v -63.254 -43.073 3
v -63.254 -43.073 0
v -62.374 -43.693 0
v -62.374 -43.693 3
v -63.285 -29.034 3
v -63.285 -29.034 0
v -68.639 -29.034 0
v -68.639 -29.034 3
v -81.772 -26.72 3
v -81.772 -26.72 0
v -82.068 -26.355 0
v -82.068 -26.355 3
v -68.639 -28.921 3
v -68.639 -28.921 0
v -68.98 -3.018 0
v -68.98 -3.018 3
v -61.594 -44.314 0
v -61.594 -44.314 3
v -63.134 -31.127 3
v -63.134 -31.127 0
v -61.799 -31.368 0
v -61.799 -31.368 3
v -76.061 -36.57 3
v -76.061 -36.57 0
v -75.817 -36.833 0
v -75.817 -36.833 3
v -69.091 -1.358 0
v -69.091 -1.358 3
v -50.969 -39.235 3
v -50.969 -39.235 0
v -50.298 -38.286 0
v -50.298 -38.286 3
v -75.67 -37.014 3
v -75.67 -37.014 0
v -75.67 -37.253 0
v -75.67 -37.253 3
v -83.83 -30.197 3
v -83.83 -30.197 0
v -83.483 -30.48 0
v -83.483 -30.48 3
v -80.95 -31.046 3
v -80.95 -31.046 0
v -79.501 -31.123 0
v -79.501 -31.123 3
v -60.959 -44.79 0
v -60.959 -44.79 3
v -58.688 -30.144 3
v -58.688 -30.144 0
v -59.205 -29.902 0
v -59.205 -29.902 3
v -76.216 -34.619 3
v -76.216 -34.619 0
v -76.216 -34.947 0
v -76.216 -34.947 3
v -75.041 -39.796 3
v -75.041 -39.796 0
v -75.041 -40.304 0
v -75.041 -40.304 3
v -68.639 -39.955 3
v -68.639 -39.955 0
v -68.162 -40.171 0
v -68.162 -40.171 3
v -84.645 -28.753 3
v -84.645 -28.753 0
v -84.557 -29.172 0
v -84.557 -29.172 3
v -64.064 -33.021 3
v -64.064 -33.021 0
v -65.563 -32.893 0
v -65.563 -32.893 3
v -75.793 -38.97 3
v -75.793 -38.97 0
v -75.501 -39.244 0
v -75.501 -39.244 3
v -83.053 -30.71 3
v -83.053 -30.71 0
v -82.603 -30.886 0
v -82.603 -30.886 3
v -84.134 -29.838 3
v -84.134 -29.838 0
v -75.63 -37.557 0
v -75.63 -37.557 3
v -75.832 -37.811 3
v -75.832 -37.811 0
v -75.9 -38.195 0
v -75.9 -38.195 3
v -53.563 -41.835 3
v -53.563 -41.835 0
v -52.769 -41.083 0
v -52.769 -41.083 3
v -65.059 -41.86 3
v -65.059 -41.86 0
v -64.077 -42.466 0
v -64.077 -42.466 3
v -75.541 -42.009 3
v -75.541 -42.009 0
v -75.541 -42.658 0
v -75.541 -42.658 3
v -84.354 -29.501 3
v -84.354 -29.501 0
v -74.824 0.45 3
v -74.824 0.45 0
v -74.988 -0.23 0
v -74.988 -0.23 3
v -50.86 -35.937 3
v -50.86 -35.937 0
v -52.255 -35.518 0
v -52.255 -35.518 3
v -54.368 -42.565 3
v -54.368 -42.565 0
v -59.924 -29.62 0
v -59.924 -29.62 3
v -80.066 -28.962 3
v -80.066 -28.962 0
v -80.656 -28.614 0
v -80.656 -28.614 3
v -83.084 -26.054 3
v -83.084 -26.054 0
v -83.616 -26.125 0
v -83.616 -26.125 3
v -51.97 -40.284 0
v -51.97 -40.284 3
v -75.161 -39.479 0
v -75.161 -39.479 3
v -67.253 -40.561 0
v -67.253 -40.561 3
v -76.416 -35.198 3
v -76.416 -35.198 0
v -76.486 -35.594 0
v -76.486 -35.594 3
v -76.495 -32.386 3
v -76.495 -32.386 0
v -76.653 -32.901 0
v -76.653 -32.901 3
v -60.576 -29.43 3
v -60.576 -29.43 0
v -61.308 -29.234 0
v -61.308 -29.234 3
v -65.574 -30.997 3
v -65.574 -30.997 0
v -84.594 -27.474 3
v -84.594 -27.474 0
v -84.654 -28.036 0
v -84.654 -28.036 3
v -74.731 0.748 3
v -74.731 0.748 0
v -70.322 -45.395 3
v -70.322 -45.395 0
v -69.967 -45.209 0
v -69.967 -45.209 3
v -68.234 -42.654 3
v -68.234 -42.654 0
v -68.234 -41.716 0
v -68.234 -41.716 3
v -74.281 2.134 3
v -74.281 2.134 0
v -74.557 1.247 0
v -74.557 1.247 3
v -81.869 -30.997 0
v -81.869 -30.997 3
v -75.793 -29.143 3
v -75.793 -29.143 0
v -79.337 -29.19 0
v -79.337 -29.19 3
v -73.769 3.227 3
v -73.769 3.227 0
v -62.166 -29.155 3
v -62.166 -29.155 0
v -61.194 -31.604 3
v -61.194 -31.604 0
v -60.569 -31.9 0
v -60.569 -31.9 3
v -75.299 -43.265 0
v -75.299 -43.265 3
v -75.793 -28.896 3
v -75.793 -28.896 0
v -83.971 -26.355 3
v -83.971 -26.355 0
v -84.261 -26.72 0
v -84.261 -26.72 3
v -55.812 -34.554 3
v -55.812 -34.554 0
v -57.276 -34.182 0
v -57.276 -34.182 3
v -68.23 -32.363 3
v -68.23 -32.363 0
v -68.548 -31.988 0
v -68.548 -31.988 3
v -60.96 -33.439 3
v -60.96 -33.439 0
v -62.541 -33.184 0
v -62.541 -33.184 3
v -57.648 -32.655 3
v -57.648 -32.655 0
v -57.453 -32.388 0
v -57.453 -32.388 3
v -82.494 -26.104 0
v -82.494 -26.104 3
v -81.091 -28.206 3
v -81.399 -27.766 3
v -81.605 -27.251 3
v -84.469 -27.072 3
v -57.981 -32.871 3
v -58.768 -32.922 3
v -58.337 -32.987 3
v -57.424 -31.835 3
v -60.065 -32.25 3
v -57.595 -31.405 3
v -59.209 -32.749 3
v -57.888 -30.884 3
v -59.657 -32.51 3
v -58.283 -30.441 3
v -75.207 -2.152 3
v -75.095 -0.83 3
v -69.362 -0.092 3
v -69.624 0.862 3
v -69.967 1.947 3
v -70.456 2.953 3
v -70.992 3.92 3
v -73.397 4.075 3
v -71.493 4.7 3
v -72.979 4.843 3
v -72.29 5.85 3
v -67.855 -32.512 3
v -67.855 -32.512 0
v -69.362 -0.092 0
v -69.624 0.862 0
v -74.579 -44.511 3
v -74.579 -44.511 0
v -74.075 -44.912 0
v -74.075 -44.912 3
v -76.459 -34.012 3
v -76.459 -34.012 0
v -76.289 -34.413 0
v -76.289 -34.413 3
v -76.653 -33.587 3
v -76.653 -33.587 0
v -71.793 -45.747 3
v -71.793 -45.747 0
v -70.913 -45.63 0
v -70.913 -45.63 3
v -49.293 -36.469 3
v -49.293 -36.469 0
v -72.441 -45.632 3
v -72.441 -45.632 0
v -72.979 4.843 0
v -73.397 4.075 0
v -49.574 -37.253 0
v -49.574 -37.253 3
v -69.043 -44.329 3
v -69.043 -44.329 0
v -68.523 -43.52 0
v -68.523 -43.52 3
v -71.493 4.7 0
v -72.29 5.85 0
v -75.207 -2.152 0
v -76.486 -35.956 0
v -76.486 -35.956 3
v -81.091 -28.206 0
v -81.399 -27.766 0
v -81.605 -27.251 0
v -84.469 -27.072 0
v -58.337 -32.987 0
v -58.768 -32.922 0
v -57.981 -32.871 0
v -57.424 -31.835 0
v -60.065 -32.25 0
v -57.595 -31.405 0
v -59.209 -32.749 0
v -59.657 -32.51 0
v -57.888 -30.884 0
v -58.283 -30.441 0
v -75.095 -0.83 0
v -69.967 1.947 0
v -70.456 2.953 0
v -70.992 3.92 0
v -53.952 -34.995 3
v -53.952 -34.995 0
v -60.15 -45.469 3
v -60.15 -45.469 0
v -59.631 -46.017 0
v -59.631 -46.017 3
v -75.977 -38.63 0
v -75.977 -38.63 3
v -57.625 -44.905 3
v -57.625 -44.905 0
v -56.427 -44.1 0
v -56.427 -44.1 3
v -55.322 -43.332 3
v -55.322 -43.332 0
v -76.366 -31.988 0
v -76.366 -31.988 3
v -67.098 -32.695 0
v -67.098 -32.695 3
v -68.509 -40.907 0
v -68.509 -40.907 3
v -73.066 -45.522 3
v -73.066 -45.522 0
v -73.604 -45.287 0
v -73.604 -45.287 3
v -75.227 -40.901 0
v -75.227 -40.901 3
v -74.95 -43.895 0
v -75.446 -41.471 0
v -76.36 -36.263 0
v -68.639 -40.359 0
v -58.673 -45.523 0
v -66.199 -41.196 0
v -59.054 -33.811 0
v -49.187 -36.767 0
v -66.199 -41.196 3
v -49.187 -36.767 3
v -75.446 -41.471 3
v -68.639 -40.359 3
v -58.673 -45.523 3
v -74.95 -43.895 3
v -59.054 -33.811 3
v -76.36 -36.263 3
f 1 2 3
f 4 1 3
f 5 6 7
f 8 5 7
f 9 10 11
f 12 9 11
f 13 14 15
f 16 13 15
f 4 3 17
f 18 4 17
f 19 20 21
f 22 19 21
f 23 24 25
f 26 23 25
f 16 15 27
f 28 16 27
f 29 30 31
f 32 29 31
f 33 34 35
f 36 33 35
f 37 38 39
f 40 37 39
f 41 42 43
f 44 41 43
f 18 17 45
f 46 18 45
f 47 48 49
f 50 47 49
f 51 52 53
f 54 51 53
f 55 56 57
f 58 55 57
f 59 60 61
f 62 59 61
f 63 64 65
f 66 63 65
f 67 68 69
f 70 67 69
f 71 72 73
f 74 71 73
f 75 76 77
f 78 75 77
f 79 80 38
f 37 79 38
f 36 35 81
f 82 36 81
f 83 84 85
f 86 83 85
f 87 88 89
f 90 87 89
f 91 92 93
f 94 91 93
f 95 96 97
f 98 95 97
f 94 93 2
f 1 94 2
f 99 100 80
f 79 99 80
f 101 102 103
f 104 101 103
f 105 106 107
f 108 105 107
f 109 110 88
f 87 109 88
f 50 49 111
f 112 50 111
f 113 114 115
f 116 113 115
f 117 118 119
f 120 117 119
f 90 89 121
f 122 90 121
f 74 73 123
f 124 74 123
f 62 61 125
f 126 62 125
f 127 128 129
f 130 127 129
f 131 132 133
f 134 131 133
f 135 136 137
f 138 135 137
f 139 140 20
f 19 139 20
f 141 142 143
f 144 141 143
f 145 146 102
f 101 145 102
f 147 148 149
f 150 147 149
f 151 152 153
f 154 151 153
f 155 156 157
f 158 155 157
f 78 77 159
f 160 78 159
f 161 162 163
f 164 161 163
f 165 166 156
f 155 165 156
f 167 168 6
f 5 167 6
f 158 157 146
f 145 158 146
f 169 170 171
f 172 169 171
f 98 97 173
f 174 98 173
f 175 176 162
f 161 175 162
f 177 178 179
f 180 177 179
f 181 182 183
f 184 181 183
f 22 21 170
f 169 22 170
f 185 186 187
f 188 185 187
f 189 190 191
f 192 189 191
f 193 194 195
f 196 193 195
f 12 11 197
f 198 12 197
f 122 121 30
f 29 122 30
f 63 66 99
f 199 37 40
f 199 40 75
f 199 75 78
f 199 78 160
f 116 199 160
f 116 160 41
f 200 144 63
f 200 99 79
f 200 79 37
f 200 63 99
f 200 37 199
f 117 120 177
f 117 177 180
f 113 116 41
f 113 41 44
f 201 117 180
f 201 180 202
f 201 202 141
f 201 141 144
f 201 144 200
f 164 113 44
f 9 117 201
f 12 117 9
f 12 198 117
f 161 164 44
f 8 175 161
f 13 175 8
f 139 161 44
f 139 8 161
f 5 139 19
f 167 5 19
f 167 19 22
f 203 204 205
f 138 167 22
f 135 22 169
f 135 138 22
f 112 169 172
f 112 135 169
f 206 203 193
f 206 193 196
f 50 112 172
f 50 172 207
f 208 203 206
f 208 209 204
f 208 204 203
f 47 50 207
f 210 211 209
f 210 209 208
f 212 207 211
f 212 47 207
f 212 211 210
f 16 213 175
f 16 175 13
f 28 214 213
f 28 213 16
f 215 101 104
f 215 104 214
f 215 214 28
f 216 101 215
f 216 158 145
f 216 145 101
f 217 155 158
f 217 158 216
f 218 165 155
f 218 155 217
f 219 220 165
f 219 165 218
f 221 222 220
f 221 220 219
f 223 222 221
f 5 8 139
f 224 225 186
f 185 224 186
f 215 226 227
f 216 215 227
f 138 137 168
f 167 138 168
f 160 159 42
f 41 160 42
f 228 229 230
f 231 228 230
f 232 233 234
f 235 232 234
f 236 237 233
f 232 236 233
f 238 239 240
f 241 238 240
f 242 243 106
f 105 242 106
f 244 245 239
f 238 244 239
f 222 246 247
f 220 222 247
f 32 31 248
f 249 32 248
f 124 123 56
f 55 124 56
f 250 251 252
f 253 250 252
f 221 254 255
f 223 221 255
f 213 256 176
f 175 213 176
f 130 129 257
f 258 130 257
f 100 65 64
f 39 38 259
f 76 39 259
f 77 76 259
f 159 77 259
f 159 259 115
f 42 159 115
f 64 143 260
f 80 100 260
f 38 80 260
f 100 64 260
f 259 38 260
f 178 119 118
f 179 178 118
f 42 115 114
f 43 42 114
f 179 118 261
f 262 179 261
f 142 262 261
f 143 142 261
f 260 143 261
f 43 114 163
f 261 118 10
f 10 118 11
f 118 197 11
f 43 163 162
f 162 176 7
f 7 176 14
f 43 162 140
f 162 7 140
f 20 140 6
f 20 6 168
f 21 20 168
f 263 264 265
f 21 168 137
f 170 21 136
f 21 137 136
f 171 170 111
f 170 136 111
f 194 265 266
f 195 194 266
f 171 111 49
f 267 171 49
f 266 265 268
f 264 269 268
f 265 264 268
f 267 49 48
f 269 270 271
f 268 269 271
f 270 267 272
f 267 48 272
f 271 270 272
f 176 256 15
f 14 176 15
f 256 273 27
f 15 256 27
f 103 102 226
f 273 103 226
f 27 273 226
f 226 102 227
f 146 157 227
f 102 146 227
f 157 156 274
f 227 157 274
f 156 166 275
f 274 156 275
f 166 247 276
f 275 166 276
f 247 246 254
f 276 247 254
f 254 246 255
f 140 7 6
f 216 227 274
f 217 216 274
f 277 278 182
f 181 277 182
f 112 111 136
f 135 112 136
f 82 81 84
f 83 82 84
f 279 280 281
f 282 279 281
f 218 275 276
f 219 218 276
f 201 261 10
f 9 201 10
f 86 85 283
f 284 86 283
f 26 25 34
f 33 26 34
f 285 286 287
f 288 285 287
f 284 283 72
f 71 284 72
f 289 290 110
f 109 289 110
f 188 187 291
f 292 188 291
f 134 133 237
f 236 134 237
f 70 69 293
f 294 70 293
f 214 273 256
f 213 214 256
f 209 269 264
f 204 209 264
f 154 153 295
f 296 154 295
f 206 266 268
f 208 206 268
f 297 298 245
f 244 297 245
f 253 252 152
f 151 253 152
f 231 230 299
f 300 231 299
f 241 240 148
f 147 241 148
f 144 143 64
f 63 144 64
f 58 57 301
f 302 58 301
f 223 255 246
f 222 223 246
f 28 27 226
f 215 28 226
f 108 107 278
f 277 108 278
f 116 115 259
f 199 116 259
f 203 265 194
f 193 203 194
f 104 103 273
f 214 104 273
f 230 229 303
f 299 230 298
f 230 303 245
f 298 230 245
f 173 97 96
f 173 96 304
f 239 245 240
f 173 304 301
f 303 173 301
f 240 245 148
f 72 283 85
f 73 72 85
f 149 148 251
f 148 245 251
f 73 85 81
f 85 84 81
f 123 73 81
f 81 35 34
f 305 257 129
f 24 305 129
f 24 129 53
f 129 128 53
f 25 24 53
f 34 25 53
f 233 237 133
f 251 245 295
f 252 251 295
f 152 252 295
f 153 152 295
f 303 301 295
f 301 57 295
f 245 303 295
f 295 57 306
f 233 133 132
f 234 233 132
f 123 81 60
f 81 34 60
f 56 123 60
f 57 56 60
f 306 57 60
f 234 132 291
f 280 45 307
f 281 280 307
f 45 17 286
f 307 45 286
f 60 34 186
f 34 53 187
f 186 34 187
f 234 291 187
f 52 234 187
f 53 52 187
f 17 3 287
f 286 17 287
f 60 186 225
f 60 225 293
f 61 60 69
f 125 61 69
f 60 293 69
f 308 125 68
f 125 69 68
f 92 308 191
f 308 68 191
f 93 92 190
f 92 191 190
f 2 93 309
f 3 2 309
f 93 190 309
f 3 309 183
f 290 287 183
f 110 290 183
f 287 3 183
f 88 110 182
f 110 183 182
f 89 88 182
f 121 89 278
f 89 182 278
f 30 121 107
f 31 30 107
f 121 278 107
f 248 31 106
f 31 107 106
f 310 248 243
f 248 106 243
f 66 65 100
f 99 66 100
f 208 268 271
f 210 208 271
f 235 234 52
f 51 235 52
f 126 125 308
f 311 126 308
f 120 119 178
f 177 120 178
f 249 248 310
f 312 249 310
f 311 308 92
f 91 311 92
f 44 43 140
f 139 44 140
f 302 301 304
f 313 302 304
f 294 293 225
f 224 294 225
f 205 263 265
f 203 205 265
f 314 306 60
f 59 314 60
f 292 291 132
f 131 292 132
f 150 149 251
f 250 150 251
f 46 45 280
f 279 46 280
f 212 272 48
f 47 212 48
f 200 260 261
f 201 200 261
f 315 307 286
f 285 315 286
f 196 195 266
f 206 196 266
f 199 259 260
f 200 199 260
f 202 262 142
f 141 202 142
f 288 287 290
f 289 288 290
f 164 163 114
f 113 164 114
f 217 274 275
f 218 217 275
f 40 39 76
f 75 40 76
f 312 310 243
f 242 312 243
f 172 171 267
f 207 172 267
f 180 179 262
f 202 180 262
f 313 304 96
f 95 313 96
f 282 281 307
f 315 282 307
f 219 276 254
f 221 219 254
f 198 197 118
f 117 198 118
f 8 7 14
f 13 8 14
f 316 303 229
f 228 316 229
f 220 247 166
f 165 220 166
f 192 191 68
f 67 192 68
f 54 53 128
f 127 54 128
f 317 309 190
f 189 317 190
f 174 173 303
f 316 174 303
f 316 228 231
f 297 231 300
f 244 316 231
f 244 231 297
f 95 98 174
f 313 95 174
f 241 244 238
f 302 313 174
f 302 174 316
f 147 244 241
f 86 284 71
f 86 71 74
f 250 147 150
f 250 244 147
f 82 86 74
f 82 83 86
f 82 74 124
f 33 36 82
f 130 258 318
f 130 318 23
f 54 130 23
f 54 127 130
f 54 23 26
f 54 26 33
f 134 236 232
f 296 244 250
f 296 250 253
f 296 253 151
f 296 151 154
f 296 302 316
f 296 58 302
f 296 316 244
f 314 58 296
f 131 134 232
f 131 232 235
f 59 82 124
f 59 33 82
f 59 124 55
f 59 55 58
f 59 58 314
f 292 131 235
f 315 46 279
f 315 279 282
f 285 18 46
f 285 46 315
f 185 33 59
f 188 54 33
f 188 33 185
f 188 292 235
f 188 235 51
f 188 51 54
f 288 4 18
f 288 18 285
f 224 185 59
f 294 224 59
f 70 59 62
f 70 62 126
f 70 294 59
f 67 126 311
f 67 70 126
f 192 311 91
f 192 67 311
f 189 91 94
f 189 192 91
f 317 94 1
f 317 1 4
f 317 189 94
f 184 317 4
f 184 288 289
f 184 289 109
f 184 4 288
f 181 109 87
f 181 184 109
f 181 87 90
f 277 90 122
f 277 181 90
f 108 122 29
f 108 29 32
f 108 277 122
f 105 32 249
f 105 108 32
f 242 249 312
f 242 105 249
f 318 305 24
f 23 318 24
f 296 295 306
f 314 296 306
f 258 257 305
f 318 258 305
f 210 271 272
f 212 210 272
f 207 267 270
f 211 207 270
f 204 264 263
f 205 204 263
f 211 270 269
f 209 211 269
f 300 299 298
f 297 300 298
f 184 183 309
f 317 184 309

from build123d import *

# Parameters (mm, degrees)
F1_DEPTH = 3


with BuildPart() as f1:
    # F0 (on Top) → F1 (new body)
    with BuildSketch(Plane.XY):
        Polygon((-70.3221669325, -45.3945461759), (-69.9666177976, -45.2090838162), (-69.0427439409, -44.3285164592), (-68.5230640816, -43.5201266018), (-68.2343540835, -42.6539947448), (-68.2343540835, -41.7156835256), (-68.5086285817, -40.9072936682), (-68.6385480809, -40.3587428091), (-68.6385480809, -39.9545488117), (-68.162176584, -40.1710813103), (-67.2527363646, -40.5608398078), (-66.1989430087, -41.1960036663), (-65.0585347908, -41.8600385246), (-64.0769170719, -42.4663313834), (-63.2540917146, -43.0726242421), (-62.3735243576, -43.6933526007), (-61.5940055, -44.3140809593), (-60.9588416415, -44.7904543189), (-60.1504508528, -45.4689246772), (-59.6307719248, -46.0174755362), (-58.6733248207, -45.5226433633), (-57.6249722513, -44.9048654345), (-56.4268555614, -44.0998804925), (-55.3223414468, -43.3323365805), (-54.3675914529, -42.5647926686), (-53.5626065108, -41.8346897868), (-52.7686665888, -41.0827976821), (-51.9697096321, -40.2838421223), (-50.9686850133, -39.235431811), (-50.2978631417, -38.2857267914), (-49.5741160708, -37.2529105453), (-49.186890002, -36.7666269421), (-49.293195189, -36.4692305384), (-50.8598664897, -35.9367971478), (-52.2547646547, -35.518327838), (-53.9518900337, -34.9952412007), (-55.8117542538, -34.5535242168), (-57.2763968381, -34.1815502552), (-59.0539591509, -33.8112321851), (-60.9603196504, -33.4392582236), (-62.5412033993, -33.1835282204), (-64.0639679628, -33.0207889137), (-65.5634829896, -32.8929239122), (-67.0978704589, -32.6953140257), (-67.8552238392, -32.5124972669), (-68.2296360033, -32.3627331463), (-68.5478856909, -31.9883209822), (-76.3657892245, -31.9883209822), (-76.4953771728, -32.3855933902), (-76.6531841951, -32.9014920799), (-76.6531841951, -33.2231708971), (-76.6531841951, -33.5873347876), (-76.4589624601, -34.0121929703), (-76.289018442, -34.4127734361), (-76.2161852914, -34.6191321669), (-76.2161852914, -34.9468794821), (-76.4161638427, -35.1980151837), (-76.4863880473, -35.5944485573), (-76.4863880473, -35.9556378035), (-76.3604229438, -36.262607312), (-76.061323111, -36.5695786832), (-75.8167727041, -36.8328915147), (-75.6701527285, -37.0137226937), (-75.6701527285, -37.2529105453), (-75.6297221529, -37.556514254), (-75.8322919717, -37.8109041035), (-75.9003969331, -38.1953738139), (-75.9773060156, -38.629545012), (-75.7932735729, -38.9696286229), (-75.501076703, -39.2442905513), (-75.1614997285, -39.4792855886), (-75.04127716, -39.7957955656), (-75.04127716, -40.3040816245), (-75.2272194373, -40.9005080519), (-75.4457188892, -41.4710325358), (-75.5409604083, -42.0086949691), (-75.5409604083, -42.6581689326), (-75.2990411716, -43.2651081292), (-74.950184499, -43.8951590268), (-74.5787451165, -44.5109644143), (-74.074771553, -44.9122769417), (-73.6038192508, -45.2872947449), (-73.0656383681, -45.5218498764), (-72.4414193923, -45.6324240208), (-71.7933583319, -45.7472215517), (-70.9127720683, -45.629954837), align=None)
    extrude(amount=F1_DEPTH)


with BuildPart() as f1b:
    # F0 (on Top) → F1, piece 2 (new body)
    with BuildSketch(Plane.XY):
        Polygon((-68.6385480809, -29.0339962748), (-68.6385480809, -28.9210007695), (-68.9798461395, -3.0179024843), (-69.0908877301, -1.3584979979), (-69.3622322875, -0.092227122), (-69.6235222864, 0.8615217002), (-69.9666177976, 1.9468924793), (-70.4561526078, 2.9525345953), (-70.9916546341, 3.9196754266), (-71.4934075373, 4.699576536), (-72.2899938124, 5.8495363983), (-72.9787385213, 4.8425233754), (-73.3972078311, 4.0753296407), (-73.76917993, 3.2269716652), (-74.2806417989, 2.1340957674), (-74.5571923665, 1.247035173), (-74.7314261394, 0.747654477), (-74.8243433417, 0.4496142691), (-74.9884169779, -0.2300921423), (-75.0947099098, -0.8301425922), (-75.2073867861, -2.1515414667), (-75.7932735729, -28.8962126879), (-75.7932735729, -29.142856708), (-79.3372653278, -29.189552184), (-80.0659310153, -28.962382912), (-80.656396051, -28.6141597835), (-81.0907560912, -28.2058659974), (-81.39926364, -27.7660117654), (-81.6045903549, -27.250877735), (-81.7722898013, -26.7203663386), (-82.0683183591, -26.3552647013), (-82.4938319246, -26.1043206894), (-83.0837128021, -26.0540210138), (-83.6156132866, -26.1248536227), (-83.9706378179, -26.3552647013), (-84.2613670771, -26.7203663386), (-84.4688471677, -27.0721802448), (-84.5941569043, -27.4741223939), (-84.6541785429, -28.0357496132), (-84.6447282005, -28.7529911612), (-84.5567265647, -29.1715935973), (-84.3535715836, -29.5007639734), (-84.1336378949, -29.8379921524), (-83.8299522298, -30.1967227069), (-83.4829488891, -30.4801912216), (-83.0528641241, -30.7098944841), (-82.6032253104, -30.8858399449), (-81.8686911958, -30.9974570928), (-80.9498706954, -31.0463310389), (-79.5010863898, -31.1233948462), (-65.5738709616, -30.9974123893), (-63.1342664121, -31.1271799567), (-61.7987083393, -31.36767458), (-61.1941737423, -31.6042313785), (-60.5685215565, -31.8998956291), (-60.0647756952, -32.2501567362), (-59.6572168293, -32.5098076073), (-59.2093689733, -32.7489979297), (-58.7682183797, -32.9216219162), (-58.337376614, -32.9870910729), (-57.9808548215, -32.871471828), (-57.6482507595, -32.6545538989), (-57.453021233, -32.3876255361), (-57.4236035102, -31.8345781761), (-57.5947545591, -31.4052664844), (-57.8879712271, -30.8837612329), (-58.2828519988, -30.4406025616), (-58.6882650965, -30.1440862744), (-59.2050476121, -29.9018622545), (-59.9241939167, -29.6204574379), (-60.575660144, -29.4303746132), (-61.3076666492, -29.233597329), (-62.1656084555, -29.1548893956), (-63.2847452658, -29.0339962748), align=None)
    extrude(amount=F1_DEPTH)


solid = Compound([f1.part, f1b.part])
